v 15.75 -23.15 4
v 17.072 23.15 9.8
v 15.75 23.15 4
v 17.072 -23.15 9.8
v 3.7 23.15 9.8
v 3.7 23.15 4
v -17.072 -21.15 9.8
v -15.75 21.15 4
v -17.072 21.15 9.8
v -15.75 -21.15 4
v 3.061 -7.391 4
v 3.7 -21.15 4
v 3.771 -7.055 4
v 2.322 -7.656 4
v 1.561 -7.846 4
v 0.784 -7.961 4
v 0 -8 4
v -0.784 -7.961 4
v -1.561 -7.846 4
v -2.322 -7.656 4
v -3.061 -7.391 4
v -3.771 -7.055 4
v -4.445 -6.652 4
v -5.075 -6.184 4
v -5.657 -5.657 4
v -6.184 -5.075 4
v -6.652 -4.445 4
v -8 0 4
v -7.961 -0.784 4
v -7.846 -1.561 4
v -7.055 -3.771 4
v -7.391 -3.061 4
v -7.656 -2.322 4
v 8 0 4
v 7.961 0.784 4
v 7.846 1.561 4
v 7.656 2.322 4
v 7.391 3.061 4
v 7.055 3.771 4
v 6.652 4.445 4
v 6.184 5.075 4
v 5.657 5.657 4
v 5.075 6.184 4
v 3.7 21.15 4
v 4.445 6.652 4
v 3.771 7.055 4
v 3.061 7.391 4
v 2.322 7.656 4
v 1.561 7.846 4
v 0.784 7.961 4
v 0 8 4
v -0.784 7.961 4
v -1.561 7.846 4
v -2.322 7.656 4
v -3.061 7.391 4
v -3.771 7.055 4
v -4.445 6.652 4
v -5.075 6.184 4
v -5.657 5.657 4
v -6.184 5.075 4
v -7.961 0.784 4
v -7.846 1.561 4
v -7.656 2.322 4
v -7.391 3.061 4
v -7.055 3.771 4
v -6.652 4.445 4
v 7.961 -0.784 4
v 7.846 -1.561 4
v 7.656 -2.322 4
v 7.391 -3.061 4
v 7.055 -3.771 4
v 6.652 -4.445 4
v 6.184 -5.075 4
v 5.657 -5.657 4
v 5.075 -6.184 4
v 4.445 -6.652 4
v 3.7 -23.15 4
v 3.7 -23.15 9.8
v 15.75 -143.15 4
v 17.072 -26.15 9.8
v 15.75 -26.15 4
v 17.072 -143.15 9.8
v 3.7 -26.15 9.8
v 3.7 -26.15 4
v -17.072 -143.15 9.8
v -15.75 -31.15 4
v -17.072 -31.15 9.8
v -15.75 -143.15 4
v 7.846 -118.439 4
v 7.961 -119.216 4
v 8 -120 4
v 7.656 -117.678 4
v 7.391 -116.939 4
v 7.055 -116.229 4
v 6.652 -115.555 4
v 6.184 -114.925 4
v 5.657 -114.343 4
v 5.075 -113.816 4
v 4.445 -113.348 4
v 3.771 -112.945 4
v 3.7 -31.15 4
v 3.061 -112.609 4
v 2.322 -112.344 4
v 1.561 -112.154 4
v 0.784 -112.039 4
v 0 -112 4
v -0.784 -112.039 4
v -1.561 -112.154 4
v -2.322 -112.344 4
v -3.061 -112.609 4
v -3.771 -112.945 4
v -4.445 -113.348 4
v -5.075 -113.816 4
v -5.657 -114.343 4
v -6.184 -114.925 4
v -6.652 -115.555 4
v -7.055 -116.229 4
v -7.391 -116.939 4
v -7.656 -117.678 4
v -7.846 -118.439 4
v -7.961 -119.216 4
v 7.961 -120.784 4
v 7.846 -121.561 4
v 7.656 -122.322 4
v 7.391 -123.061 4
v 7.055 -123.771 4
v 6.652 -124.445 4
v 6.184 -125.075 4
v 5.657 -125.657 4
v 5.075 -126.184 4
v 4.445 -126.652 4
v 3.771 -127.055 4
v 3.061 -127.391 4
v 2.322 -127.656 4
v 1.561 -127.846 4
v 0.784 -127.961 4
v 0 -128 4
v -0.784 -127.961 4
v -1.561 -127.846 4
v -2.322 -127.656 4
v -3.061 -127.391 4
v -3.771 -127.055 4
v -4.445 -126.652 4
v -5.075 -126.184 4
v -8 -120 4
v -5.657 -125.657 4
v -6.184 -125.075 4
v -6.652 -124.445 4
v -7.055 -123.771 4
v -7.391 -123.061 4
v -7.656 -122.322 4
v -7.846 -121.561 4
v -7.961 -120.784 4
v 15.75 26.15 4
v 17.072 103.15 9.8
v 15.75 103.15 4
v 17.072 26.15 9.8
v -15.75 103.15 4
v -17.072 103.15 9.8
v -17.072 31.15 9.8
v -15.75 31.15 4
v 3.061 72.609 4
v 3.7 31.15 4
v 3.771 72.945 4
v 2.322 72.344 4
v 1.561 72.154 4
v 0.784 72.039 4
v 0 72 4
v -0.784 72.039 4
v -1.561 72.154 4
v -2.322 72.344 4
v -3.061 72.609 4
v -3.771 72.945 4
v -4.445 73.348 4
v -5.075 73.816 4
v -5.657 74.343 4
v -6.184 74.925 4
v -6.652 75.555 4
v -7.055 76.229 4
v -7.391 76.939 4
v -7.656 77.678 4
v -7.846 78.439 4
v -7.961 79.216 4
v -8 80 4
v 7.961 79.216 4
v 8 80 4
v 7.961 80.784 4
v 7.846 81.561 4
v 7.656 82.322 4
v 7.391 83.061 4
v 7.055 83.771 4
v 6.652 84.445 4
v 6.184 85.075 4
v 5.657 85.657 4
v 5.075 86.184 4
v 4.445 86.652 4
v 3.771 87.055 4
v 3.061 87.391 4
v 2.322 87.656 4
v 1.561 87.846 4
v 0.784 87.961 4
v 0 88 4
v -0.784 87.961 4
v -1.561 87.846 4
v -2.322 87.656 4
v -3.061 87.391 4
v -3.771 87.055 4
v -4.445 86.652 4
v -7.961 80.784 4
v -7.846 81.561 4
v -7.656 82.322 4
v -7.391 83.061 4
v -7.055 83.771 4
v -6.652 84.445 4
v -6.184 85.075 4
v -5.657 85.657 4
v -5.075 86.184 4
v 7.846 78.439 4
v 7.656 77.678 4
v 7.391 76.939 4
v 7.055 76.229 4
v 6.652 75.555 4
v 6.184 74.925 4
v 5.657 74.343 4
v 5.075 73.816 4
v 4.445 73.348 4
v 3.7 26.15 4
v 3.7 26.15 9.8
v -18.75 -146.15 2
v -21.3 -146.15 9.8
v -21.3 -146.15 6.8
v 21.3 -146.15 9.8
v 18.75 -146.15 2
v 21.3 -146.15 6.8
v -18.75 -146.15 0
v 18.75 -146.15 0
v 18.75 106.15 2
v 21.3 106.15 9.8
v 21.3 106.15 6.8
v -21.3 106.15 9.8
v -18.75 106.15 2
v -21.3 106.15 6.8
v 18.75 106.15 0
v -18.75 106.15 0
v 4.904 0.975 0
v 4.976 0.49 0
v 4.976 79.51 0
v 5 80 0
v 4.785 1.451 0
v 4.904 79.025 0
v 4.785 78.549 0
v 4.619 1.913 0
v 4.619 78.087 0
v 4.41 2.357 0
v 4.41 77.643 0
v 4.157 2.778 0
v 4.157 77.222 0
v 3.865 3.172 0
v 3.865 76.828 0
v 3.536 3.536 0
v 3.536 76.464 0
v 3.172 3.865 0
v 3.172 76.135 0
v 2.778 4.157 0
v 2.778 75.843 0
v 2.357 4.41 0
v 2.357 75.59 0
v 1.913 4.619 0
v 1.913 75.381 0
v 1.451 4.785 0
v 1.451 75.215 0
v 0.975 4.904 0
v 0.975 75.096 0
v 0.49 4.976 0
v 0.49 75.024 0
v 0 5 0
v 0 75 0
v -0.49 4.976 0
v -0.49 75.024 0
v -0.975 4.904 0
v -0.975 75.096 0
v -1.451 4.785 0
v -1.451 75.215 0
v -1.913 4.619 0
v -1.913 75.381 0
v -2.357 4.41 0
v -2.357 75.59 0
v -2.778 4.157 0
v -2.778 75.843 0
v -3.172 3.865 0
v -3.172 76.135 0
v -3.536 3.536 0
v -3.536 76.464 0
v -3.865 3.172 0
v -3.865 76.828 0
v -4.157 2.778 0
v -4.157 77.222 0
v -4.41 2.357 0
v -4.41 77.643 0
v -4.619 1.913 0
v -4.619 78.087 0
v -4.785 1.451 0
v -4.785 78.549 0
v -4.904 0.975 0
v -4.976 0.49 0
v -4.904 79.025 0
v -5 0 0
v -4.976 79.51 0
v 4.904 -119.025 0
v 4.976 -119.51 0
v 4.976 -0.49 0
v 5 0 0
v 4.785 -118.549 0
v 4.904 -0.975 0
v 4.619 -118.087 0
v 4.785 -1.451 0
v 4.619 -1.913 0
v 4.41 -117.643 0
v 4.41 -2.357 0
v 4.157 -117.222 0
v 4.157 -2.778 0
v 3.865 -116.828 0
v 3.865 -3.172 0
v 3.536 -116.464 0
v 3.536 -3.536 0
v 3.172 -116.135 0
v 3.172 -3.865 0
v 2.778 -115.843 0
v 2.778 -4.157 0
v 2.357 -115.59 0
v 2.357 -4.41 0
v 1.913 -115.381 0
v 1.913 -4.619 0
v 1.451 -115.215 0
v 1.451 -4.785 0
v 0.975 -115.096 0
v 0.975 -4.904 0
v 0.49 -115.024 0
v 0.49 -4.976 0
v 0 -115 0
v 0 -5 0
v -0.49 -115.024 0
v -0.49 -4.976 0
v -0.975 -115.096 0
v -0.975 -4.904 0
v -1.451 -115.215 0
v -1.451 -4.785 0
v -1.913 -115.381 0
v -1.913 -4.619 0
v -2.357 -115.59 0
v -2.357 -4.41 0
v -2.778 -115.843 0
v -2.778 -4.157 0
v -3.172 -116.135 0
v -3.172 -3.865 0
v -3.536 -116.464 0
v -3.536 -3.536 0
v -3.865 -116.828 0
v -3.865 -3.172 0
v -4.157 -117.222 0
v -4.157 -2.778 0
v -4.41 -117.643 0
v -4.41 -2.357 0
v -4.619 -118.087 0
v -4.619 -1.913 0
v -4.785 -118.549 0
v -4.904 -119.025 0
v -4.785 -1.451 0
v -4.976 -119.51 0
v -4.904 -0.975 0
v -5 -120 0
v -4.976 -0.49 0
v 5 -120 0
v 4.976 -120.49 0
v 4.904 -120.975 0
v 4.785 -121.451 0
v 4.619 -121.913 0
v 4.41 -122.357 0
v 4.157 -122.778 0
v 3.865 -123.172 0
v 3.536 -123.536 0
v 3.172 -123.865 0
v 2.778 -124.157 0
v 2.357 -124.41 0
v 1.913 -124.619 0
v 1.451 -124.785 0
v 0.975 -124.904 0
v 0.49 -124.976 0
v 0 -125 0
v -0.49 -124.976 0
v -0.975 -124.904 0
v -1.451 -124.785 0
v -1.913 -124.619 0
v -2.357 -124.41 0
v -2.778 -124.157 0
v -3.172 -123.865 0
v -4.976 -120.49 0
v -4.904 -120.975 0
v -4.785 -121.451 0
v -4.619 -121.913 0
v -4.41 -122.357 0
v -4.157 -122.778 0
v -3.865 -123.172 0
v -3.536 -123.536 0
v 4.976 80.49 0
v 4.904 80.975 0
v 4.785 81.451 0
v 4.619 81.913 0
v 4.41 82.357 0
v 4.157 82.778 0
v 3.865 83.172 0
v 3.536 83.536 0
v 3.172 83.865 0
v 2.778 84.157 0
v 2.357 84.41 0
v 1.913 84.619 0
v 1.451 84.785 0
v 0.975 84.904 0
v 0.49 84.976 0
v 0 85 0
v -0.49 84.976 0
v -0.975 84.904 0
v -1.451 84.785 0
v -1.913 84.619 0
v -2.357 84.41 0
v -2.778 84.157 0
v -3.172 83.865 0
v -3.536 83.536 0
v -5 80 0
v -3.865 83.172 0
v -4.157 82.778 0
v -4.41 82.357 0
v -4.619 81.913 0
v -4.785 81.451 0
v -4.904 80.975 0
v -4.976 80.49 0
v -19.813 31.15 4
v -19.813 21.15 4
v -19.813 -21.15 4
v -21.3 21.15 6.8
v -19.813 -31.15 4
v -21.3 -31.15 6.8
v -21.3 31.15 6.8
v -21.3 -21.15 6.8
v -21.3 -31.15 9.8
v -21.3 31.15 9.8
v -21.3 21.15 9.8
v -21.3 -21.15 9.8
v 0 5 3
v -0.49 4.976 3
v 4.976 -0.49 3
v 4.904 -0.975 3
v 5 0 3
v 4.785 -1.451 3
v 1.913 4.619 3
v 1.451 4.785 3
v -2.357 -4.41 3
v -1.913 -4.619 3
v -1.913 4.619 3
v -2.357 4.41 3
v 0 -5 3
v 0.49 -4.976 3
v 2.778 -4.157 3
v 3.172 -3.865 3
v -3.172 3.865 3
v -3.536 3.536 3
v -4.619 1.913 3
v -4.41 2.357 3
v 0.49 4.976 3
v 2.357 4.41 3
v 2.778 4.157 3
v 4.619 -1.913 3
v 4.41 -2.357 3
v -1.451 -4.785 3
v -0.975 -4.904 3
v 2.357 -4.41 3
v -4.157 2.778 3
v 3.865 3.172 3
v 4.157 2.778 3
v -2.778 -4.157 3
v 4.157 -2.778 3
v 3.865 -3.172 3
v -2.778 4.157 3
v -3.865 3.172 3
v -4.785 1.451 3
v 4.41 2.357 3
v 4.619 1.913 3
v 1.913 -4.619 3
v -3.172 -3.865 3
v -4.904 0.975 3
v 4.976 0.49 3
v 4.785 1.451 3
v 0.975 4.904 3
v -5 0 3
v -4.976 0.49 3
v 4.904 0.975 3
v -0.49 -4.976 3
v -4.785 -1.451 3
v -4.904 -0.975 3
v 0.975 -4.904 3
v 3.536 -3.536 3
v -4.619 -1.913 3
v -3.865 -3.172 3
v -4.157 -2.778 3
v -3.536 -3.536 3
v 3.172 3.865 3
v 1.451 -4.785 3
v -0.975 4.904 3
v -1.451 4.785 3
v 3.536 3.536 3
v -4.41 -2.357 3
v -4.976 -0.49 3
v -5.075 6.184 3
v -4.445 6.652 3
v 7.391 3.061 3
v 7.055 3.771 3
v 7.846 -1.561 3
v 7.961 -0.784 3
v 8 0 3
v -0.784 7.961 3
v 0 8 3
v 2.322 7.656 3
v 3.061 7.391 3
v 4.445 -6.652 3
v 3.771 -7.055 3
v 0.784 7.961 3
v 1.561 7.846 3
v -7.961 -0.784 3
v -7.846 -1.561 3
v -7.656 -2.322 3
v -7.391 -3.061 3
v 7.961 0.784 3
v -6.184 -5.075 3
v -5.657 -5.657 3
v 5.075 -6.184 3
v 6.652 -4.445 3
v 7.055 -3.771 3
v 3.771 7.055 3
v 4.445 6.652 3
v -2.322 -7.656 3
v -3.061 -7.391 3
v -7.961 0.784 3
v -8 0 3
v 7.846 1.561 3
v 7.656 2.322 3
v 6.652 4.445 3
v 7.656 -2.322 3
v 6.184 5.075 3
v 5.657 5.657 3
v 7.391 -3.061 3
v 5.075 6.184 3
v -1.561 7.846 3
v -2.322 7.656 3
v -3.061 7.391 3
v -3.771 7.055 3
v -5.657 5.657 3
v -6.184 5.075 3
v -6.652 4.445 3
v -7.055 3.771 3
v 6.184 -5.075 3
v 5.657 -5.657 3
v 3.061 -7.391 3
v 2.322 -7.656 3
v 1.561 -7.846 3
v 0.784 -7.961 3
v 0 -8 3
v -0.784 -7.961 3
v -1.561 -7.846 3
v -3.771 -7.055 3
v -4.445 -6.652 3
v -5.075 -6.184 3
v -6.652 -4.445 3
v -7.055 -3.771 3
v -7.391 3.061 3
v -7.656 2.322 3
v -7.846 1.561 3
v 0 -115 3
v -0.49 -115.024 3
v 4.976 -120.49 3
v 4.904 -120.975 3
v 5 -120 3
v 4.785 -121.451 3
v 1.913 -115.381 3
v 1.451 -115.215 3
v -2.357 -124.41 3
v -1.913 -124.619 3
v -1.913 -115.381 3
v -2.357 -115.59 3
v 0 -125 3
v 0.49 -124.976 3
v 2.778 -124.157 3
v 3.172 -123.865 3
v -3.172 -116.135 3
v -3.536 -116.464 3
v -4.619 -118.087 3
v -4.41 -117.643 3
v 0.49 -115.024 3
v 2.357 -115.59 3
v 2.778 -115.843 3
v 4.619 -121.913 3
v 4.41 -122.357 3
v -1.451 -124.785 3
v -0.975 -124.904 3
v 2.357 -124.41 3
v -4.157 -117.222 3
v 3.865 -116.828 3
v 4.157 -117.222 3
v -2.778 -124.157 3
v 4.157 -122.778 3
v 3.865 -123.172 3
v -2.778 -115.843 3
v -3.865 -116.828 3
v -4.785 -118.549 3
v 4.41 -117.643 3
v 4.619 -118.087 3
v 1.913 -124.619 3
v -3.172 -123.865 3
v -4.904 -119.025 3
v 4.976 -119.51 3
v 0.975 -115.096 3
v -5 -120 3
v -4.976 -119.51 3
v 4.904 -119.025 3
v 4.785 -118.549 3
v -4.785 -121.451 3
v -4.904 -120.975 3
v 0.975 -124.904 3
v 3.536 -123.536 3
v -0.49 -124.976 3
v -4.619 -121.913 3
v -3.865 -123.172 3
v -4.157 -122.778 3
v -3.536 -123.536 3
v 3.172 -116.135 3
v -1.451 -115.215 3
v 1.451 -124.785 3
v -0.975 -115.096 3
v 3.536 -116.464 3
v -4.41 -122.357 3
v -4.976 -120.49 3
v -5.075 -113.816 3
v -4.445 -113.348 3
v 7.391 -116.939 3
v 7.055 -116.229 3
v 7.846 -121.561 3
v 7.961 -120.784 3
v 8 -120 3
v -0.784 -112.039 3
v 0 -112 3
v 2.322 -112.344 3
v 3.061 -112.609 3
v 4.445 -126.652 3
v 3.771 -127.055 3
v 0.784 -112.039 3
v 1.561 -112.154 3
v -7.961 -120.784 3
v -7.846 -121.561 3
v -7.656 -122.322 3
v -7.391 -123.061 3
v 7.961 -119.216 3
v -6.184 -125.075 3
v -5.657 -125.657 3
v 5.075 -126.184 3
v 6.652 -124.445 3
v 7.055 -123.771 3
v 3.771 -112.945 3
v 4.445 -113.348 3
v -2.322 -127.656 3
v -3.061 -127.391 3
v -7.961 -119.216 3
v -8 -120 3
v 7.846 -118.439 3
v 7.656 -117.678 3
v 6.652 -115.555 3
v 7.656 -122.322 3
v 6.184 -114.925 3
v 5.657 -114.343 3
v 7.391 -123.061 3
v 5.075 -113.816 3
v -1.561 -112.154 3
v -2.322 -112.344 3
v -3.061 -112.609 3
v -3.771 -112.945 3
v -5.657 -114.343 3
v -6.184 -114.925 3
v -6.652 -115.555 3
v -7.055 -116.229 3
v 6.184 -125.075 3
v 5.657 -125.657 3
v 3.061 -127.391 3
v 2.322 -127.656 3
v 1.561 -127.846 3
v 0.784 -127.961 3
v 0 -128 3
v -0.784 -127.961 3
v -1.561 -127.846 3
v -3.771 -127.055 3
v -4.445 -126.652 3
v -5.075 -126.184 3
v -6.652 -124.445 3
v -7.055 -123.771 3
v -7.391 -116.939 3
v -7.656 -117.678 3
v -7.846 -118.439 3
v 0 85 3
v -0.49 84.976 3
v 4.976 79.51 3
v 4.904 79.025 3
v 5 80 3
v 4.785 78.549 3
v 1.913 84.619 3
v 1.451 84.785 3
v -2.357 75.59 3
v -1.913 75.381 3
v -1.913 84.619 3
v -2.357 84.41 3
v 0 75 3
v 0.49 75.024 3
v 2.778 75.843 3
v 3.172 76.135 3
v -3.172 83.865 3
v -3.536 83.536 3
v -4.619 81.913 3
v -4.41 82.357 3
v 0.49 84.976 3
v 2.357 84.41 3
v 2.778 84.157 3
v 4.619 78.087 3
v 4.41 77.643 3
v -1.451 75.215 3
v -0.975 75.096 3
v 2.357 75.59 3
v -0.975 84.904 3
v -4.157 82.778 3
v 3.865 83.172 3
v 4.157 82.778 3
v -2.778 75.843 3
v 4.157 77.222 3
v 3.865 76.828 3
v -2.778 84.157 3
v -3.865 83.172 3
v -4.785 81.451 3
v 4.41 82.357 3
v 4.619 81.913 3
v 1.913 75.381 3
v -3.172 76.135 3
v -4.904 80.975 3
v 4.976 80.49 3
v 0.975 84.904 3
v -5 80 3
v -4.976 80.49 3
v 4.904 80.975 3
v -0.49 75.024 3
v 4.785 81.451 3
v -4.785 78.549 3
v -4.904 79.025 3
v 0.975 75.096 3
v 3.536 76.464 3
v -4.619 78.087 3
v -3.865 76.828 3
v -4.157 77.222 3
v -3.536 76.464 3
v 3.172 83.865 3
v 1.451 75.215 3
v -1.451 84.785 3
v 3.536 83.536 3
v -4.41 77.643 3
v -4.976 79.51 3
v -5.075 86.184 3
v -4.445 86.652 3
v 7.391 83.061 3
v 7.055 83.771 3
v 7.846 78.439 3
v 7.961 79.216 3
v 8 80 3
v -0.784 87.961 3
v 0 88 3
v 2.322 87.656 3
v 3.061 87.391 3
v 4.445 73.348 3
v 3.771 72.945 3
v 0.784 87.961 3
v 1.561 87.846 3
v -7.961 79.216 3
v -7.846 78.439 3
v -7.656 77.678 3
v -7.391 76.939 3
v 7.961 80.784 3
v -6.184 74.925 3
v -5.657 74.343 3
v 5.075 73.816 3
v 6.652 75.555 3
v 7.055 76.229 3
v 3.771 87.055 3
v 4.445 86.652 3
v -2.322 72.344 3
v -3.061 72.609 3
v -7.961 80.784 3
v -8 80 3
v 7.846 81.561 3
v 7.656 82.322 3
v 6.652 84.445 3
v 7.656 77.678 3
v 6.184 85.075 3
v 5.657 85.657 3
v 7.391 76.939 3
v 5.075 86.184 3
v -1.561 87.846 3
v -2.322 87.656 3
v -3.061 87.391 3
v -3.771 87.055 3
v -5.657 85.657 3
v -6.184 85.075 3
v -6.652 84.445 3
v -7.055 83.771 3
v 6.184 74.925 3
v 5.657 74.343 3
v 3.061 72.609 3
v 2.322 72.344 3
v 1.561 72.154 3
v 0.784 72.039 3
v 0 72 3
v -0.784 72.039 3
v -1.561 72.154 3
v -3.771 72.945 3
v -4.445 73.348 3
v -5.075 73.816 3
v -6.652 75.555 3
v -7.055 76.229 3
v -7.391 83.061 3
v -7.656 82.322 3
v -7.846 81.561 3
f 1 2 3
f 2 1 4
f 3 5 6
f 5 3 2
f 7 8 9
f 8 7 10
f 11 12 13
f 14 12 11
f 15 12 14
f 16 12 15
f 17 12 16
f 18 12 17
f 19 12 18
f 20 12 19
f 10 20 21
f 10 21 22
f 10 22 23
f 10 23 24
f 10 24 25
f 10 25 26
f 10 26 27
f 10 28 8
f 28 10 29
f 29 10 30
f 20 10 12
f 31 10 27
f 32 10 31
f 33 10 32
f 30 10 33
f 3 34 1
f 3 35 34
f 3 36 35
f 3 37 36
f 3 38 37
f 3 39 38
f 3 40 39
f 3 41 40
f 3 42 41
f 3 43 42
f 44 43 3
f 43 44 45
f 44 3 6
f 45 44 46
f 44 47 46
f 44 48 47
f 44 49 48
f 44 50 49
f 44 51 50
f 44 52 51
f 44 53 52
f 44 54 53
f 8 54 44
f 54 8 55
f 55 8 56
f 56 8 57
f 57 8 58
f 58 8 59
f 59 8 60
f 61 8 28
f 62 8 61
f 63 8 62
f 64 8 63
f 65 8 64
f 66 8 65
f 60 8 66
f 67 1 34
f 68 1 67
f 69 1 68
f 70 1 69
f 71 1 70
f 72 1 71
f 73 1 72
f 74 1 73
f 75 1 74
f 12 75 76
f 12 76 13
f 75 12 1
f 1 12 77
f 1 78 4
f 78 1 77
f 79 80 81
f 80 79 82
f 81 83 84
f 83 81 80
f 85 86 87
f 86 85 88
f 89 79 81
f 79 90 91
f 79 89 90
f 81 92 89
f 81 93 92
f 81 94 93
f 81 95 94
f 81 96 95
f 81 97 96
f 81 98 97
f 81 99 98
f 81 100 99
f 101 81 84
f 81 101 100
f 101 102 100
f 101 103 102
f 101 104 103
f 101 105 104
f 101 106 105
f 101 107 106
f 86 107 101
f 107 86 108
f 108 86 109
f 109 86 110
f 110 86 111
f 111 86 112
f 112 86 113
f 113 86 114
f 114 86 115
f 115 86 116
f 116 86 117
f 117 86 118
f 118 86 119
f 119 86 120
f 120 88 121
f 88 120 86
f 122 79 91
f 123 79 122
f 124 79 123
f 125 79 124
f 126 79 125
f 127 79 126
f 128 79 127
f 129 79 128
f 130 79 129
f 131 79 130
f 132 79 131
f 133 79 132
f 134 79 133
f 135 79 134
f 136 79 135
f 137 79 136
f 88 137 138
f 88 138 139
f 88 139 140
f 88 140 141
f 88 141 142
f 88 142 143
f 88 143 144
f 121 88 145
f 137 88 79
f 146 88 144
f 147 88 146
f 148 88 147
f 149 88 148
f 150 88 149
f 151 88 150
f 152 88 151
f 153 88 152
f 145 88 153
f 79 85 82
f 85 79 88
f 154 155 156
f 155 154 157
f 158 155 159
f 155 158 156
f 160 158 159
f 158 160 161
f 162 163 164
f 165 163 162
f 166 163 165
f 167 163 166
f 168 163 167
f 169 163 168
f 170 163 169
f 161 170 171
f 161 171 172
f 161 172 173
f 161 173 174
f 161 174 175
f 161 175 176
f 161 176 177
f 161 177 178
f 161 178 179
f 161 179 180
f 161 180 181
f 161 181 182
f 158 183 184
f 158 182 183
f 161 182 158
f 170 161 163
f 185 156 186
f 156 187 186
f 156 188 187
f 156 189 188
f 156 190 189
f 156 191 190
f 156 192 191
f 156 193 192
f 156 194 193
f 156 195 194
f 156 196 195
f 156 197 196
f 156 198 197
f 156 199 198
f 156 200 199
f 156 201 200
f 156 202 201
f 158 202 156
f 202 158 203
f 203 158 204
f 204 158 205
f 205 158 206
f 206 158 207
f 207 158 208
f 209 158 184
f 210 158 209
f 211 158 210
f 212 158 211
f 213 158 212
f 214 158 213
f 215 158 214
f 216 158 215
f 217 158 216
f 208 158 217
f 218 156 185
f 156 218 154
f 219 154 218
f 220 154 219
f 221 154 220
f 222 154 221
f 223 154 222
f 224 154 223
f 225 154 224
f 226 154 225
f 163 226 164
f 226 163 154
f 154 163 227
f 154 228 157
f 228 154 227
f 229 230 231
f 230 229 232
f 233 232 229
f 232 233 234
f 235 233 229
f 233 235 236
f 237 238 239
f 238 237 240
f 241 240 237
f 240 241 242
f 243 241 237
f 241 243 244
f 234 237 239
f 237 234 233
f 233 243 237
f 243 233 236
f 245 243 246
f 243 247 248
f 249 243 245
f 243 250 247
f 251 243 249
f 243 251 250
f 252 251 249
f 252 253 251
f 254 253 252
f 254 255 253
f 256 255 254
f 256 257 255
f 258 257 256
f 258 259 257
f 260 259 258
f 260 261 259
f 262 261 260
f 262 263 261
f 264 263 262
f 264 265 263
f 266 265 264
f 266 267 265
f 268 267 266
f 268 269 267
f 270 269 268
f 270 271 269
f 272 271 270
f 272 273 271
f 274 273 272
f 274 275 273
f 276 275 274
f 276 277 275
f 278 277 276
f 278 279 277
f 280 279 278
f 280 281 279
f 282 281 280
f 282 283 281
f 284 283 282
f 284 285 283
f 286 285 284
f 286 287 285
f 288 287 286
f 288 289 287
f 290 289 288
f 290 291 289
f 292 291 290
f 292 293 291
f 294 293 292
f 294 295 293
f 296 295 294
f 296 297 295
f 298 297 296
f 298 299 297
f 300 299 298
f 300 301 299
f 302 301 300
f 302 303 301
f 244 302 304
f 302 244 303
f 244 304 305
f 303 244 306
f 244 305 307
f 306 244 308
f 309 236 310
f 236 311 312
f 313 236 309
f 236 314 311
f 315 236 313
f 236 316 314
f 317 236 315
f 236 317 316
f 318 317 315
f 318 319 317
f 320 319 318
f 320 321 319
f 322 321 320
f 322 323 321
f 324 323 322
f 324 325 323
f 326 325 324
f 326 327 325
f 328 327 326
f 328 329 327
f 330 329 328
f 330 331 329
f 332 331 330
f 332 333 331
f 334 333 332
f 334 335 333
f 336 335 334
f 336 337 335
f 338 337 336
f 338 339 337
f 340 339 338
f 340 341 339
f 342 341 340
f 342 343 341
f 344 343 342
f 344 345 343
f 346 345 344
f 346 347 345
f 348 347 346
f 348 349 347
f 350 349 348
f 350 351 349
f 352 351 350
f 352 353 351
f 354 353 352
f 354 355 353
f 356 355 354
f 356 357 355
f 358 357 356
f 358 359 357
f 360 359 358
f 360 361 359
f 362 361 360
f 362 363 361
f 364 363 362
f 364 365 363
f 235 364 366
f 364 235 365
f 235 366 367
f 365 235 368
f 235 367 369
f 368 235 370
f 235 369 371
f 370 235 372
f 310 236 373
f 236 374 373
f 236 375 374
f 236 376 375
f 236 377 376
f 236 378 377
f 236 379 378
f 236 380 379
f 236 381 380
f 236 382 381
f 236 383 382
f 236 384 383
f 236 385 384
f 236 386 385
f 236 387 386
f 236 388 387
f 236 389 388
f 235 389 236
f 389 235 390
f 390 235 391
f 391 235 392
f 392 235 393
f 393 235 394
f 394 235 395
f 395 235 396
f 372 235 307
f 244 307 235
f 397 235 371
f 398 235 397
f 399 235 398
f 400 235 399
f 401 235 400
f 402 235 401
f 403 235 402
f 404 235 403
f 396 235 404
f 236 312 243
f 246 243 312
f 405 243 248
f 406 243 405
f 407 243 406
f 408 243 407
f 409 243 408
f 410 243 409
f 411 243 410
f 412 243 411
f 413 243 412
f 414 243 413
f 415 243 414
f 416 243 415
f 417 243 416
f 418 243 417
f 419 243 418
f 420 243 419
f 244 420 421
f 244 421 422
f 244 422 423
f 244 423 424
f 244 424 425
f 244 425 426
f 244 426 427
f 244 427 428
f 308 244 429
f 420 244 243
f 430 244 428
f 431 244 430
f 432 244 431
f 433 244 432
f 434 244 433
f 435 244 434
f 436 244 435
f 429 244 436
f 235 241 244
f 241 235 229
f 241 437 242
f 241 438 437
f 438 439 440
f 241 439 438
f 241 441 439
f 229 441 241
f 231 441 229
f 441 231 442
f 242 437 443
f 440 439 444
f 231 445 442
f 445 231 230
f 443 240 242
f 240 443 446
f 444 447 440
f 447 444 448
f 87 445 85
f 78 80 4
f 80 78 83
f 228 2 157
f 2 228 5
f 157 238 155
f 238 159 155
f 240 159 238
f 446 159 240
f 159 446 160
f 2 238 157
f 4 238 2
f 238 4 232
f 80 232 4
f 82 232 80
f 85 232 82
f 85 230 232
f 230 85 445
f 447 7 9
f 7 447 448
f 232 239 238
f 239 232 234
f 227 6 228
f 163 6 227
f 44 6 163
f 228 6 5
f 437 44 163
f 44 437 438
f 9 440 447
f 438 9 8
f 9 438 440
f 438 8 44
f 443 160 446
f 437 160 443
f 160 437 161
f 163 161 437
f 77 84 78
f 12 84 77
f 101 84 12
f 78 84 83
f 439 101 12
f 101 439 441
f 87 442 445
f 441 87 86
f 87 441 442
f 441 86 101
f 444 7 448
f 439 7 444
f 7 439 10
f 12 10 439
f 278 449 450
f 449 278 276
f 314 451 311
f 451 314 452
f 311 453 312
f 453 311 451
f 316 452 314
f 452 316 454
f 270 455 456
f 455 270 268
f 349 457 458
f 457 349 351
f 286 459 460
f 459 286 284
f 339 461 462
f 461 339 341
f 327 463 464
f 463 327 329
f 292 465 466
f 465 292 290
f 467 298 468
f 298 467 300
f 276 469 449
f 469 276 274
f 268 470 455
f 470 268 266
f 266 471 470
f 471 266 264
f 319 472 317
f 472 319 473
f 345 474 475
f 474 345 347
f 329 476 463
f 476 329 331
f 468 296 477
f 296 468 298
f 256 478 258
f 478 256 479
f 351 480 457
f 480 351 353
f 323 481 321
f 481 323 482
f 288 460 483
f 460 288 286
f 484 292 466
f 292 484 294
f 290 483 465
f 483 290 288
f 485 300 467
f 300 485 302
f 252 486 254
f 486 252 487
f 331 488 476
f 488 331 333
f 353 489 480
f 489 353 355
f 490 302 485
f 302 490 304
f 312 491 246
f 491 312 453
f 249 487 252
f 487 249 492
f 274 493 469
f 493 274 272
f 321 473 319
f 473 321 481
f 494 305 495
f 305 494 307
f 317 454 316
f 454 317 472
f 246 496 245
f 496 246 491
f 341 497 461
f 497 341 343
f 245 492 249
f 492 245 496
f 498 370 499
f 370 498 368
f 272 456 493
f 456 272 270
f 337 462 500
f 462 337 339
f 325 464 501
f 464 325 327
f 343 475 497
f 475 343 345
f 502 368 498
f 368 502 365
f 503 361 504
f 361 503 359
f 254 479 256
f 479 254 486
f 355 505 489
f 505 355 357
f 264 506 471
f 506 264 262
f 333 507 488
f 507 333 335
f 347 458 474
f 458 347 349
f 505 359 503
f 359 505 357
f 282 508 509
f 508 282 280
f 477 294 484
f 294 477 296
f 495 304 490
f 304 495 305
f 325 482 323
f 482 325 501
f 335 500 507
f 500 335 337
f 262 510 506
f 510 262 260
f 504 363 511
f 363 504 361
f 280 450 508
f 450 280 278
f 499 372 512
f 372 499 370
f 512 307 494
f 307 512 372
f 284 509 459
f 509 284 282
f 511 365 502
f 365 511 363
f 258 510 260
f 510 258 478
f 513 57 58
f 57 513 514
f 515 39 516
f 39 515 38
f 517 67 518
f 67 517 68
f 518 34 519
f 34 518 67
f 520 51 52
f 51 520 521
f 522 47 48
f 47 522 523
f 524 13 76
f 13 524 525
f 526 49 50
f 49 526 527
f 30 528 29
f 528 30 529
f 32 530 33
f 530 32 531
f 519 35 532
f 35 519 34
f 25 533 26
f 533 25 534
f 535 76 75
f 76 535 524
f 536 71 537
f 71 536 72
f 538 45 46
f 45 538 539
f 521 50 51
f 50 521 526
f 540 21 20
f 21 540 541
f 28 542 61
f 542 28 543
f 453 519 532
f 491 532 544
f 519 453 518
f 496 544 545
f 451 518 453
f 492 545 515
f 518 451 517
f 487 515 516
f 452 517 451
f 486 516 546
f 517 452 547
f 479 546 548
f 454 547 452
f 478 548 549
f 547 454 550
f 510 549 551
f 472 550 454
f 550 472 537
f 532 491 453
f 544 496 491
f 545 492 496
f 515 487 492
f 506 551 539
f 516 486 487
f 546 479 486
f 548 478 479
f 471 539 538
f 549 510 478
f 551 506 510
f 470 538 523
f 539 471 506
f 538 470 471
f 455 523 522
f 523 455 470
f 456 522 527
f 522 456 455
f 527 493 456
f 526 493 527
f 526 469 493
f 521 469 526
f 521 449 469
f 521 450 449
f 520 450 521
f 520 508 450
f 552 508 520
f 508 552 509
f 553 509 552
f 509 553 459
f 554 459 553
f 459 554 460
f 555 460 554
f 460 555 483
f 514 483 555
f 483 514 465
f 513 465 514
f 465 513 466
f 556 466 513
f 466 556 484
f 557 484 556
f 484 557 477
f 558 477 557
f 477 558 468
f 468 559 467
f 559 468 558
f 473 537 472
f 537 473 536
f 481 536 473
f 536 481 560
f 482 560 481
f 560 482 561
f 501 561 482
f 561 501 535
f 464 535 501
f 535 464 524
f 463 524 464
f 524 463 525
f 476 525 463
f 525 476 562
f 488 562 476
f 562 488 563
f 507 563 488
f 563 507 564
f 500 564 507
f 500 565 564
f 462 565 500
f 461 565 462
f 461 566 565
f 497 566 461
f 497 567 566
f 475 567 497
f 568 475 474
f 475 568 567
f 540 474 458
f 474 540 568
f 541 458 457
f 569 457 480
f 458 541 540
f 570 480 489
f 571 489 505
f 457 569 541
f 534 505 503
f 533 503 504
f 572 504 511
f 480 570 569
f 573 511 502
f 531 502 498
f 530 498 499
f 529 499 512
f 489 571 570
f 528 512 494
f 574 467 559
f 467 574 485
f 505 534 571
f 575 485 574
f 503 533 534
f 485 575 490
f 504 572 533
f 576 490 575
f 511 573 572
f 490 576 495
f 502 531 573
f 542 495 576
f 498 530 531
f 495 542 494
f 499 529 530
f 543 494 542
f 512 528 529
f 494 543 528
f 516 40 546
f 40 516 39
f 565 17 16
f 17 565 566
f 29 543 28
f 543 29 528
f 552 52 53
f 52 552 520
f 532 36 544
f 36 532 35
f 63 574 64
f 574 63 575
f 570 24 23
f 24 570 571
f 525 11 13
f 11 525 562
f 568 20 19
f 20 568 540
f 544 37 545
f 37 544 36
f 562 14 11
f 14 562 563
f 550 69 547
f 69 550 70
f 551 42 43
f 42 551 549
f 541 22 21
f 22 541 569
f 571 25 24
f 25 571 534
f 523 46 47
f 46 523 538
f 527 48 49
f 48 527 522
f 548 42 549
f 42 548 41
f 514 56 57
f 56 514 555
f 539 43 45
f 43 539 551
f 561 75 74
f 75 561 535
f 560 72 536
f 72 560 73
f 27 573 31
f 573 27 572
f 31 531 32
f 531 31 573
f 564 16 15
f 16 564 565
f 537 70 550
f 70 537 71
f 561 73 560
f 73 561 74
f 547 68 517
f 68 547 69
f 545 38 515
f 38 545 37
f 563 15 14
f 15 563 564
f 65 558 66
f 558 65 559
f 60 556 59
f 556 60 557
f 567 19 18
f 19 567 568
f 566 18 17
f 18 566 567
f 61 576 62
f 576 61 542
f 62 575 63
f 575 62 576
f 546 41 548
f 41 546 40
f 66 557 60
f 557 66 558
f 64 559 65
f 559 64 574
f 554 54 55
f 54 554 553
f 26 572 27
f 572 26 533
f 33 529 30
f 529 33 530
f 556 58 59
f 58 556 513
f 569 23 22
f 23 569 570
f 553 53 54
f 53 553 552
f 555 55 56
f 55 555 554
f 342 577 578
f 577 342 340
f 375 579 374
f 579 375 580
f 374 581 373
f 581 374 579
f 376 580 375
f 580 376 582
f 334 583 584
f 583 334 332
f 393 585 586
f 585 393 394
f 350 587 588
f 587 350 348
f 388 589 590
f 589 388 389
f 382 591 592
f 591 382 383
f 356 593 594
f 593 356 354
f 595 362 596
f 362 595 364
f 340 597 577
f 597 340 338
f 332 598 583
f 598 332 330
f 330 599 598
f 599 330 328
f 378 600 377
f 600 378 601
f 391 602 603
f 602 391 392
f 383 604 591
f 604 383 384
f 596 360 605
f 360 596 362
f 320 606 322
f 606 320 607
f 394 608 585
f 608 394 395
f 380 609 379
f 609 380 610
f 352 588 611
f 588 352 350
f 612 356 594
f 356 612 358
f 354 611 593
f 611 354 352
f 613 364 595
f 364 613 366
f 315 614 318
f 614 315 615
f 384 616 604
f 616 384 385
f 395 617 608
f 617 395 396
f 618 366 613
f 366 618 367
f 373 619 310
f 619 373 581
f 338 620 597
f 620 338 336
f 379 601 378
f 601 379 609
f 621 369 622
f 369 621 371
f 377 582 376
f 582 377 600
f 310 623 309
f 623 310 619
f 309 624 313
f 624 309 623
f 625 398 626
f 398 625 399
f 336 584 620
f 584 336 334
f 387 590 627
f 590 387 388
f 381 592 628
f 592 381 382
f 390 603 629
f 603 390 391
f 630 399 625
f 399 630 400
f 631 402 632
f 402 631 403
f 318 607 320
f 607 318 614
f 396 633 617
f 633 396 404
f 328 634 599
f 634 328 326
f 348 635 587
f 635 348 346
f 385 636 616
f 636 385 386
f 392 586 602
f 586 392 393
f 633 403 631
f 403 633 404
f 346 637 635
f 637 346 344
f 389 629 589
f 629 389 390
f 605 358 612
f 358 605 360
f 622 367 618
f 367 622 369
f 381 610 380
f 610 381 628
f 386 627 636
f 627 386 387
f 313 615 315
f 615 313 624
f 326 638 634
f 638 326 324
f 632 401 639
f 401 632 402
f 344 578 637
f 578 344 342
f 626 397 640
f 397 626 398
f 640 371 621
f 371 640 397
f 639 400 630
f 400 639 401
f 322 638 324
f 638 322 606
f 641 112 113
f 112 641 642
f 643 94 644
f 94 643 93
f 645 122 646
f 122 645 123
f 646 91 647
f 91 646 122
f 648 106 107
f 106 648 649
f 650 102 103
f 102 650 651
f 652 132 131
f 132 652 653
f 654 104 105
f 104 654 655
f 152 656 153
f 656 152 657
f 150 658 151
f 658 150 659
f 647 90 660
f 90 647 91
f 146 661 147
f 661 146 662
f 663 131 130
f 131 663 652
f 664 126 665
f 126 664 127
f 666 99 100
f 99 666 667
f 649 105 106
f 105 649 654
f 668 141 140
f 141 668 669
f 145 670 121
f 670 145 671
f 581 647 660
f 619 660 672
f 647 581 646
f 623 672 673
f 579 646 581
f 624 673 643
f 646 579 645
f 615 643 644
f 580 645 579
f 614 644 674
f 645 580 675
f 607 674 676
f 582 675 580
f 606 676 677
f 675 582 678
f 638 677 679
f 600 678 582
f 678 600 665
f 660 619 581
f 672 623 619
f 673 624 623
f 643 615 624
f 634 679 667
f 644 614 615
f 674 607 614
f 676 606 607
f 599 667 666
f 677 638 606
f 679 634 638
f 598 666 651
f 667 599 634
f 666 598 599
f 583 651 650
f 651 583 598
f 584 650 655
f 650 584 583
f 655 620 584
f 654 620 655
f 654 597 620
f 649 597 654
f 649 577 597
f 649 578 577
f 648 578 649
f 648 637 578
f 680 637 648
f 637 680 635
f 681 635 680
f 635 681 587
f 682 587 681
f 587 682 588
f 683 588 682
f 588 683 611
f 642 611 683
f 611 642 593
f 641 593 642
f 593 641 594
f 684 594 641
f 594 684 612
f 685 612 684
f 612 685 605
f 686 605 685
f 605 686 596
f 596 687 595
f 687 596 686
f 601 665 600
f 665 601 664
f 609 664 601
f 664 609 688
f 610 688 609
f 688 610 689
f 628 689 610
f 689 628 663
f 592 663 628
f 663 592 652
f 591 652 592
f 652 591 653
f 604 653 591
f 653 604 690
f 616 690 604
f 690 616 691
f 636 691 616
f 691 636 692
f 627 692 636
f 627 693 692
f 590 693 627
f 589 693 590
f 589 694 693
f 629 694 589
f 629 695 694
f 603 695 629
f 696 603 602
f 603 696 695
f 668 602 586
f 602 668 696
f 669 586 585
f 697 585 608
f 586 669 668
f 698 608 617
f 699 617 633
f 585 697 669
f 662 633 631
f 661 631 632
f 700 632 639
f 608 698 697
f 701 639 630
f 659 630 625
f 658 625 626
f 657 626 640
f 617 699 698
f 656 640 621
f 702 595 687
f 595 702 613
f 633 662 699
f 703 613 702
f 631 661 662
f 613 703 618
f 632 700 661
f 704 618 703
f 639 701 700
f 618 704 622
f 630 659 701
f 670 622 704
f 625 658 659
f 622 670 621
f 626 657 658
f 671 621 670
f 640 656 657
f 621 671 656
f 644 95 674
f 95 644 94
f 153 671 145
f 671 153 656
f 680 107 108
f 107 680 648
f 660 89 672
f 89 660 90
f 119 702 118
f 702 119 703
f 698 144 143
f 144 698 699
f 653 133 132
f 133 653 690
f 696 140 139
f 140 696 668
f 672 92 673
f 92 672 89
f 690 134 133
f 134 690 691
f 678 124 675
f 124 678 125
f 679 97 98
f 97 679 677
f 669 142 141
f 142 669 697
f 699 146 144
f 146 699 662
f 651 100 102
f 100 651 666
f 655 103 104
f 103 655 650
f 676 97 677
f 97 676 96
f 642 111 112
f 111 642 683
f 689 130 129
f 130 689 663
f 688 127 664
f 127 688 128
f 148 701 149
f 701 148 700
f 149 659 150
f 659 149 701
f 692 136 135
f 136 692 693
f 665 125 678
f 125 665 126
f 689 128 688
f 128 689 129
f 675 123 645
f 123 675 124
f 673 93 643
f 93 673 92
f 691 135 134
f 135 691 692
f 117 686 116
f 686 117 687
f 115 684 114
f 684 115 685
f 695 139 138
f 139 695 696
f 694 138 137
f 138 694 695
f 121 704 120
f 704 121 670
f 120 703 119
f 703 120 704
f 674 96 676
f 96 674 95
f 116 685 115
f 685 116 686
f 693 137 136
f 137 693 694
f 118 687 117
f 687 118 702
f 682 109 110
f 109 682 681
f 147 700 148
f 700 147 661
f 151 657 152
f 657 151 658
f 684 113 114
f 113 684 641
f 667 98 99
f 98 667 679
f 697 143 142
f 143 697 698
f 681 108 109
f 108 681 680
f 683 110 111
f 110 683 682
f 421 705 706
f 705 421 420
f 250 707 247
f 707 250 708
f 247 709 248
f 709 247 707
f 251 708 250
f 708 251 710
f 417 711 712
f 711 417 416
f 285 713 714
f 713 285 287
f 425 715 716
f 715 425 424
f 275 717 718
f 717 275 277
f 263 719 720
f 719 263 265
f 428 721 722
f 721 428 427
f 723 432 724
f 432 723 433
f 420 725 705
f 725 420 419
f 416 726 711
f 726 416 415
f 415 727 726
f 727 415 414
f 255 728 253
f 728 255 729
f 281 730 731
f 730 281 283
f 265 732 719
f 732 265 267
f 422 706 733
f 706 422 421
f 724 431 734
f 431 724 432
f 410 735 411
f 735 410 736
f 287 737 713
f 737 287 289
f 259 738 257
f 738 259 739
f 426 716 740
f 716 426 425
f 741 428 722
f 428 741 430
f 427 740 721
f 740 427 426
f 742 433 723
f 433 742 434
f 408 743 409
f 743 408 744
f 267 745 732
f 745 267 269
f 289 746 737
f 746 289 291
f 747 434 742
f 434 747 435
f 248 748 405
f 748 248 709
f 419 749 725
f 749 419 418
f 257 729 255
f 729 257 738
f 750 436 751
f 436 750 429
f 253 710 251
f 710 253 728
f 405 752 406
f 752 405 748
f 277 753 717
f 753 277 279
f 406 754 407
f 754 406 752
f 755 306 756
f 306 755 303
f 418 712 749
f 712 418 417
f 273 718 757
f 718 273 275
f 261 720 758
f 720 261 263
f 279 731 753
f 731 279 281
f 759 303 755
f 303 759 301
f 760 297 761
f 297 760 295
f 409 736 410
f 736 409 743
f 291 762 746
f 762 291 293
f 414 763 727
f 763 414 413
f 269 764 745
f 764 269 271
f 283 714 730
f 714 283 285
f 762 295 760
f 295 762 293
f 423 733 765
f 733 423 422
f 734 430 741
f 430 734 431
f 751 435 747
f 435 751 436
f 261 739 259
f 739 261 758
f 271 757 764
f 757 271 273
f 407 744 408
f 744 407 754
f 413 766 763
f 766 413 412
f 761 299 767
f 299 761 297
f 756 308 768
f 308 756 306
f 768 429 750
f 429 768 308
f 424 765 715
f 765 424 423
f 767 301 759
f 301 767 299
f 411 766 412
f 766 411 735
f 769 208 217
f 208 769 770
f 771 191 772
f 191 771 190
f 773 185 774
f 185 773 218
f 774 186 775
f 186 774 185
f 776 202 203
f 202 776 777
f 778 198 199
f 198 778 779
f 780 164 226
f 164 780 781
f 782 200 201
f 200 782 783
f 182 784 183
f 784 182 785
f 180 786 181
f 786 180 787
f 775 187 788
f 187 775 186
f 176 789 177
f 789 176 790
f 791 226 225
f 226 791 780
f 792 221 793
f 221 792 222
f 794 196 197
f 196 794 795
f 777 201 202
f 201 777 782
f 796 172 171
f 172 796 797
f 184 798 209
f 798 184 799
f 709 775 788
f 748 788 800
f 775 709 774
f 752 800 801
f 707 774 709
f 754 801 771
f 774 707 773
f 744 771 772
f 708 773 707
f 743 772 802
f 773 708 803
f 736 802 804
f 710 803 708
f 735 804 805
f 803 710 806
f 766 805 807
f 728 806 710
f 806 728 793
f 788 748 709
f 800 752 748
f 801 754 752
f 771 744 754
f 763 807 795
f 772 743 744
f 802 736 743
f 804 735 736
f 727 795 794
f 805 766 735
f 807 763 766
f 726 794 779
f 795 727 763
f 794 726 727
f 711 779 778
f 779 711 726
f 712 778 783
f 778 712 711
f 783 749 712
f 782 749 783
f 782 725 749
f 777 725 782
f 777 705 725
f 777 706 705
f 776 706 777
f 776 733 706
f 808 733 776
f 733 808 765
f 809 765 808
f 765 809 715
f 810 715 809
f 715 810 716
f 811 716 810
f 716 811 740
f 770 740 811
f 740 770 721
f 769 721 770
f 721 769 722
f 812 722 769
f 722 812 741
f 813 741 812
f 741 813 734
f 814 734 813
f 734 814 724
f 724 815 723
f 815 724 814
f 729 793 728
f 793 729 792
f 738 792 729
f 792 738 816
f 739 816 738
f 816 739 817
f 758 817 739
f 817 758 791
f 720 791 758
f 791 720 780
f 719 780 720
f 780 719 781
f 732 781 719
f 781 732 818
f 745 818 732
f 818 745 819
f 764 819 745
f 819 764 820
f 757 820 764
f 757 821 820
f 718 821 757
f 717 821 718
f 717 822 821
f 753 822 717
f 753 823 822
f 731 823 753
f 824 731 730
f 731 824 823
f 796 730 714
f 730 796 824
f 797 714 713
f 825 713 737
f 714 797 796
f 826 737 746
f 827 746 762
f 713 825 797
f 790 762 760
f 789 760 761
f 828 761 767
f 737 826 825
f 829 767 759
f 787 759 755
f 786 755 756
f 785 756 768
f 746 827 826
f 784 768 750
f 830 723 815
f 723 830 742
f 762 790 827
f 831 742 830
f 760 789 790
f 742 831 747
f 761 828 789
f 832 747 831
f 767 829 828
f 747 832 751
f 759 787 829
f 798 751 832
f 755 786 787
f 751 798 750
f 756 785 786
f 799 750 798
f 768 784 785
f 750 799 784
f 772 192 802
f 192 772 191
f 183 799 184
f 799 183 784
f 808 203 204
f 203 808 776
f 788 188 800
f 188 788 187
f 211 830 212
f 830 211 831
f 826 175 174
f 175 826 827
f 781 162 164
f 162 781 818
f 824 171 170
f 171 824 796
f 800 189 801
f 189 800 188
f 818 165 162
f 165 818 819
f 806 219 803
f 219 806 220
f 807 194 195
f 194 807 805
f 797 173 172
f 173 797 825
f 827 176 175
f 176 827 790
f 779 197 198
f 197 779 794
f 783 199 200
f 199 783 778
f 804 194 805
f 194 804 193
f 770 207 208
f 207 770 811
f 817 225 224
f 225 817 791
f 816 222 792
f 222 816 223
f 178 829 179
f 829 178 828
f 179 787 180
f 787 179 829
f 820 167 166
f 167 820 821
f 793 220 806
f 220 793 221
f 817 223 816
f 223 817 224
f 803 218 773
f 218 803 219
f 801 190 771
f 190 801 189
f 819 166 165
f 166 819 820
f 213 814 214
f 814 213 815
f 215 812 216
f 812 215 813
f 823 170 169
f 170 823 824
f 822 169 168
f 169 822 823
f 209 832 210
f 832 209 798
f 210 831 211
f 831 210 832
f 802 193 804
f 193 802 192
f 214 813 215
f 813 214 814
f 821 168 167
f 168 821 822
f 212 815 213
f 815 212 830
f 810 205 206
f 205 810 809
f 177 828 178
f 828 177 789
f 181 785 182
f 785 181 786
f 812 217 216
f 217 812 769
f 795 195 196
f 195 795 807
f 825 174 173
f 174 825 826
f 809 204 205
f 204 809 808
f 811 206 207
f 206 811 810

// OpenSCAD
//
// manfrotto 484rc2 quick plate replacement, with variable width
//
// Copyright 2013-2014 Sébastien Roy (roys@iro.umontreal.ca)
// Licence: public domain
// 

/* [General] */

// Extra width on one side
extra_left=120; // [0:150] 

// Extra width on the other side
extra_right=80; // [0:150]

/* [Left Hole] */

left_hole_style="standard"; // [standard,3/8 tap, 1/4 tap,prosilica,custom,none]
// (used if style is "custom")
left_hole_diameter=20;
left_hole_x_offset=0;
left_hole_y_offset=0;

/* [Middle Hole] */

middle_hole_style="standard"; // [standard,3/8 tap,1/4 tap,prosilica,customm,none]
// (used if style is "custom")
middle_hole_diameter=20;
middle_hole_x_offset=0;
middle_hole_y_offset=0;

/* [Right Hole] */

right_hole_style="standard"; // [standard,3/8 tap,1/4 tap,prosilica,custom,none]
// (used if style is "custom")
right_hole_diameter=20;
right_hole_x_offset=0;
right_hole_y_offset=0;




// to stop customizer
module nop() { }

length = 2; //[1:32]
width = 2; //[1:32]
type = 9.6; //[9.6:Brick, 3.2:Tile, 19.2:Double Brick]
flat = 0; //[0:No, 1.9:Yes]
/* [Hidden] */

//
// General dimensions of the plate
//
// "largeur" determines how well the plate will attach to the head.
// "profondeur" is the width of the plate. 
//
largeur=42.6;
largeurtop=37.5;
profondeur=52.3;
hauteur=9.8;


//
// un solide "tappered" en x,
// de dimension largeur x prodondeur x hauteur
//
module tappered(largeur=30,largeurtop=20,profondeur=40,hauteur=10,head=2,base=3) {
      off=(largeur-largeurtop)/2;
	translate([0,profondeur,0])
	rotate([90,0,0])
	linear_extrude(height=profondeur)
		polygon(points=[
			[0,0],
			[largeur,0],
			[largeur,base],
			[largeurtop+off,hauteur-head],
			[largeurtop+off,hauteur],
			[off,hauteur],
			[off,hauteur-head],
			[0,base]
		]);
}

//
// solid plate
//
module m_base(extra1=0,extra2=0) {
	translate([0,-extra2,0]) tappered(largeur,largeurtop,profondeur+extra1+extra2,hauteur);
}


//
// inside material to remove from plate
//
module m_interieur(extra1=0,extra2=0) {
	translate([4,3,-1]) tappered(largeur-8,largeurtop-6,profondeur-6,hauteur-3,0,0);
	translate([4,profondeur,-1]) tappered(largeur-8,largeurtop-6,extra1-3,hauteur-3,0,0);
	translate([4,0*profondeur-extra2+3,-1]) tappered(largeur-8,largeurtop-6,extra2-3,hauteur-3,0,0);
}

//
// side material to be removed from the plate
//
module m_notch(extra1=0) {
	w=3;
	translate([-5,-5,-4]) cube([largeur-17.6+5,10+extra1,hauteur]);
}

//
// one hole in the plate. r is the radius,
// pos is the (x,y) position on the plate (leave z at 0).
// the (0,0) position is the center of the plate.
//
module m_trou(r=5,pos=[0,0,0]) {
	translate([largeur/2,profondeur/2,0]+pos) cylinder(h=hauteur*2,r=r,$fn=64);
}

module m_trou_counter(r=5,rr=16/2,hh=1,pos=[0,0,0]) {
	translate([largeur/2,profondeur/2,0]+pos) cylinder(h=hauteur*2,r=r,$fn=64);
	translate([largeur/2,profondeur/2,0]+pos) cylinder(h=hauteur-4+hh,r=rr,$fn=64);
}



module m_holes(style="standard",offset=[0,0,0],dia) {
	if( style=="standard" ) {
		m_trou_counter(10/2,16/2,1,offset);
	} else if( style=="3/8 tap" ) {
		m_trou(5/16*25.4/2,offset);
	} else if( style=="1/4 tap" ) {
		m_trou(13/64*25.4/2,offset);
	} else if( style=="prosilica" ) {
		m_trou(1.7,[-9,-13,0]+offset);
		m_trou(1.7,[-9,13,0]+offset);
	} else if( style=="custom" ) {
		m_trou(dia/2,offset);
	}
}

//
// position the following model to make it printable
// this is set for up=z-axis printing (ex: mendelmax)
// Change it for your printer...
//
module m_printable() {
	translate([-largeur/2,profondeur/2,hauteur])
	rotate([180,0,0])
	child(0);
};


//
// Basic complete plate, without holes
//
module m_manfrotto484() {
	difference() {
		m_base(extra_left,extra_right);
		m_interieur(extra_left,extra_right);
		m_notch(0);
		translate([0,profondeur,0]) m_notch(0/*extraprof*/);
/*
		if( extra_left>20 ) {		
			m_trou(r=5,pos=[0,extra_left,0]);
		}
		if( extra_right>20 ) {		
			m_trou(r=5,pos=[0,-extra_right,0]);
		}
*/
	}
}

//
// example of a plate with 4 holes.
// Change as needed.
//
module m_manfrotto484_generic() {
	difference() {
		m_manfrotto484();
		m_holes(middle_hole_style,[middle_hole_x_offset,middle_hole_y_offset,0],middle_hole_diameter);
		if( extra_left>20 ) m_holes(left_hole_style,[left_hole_x_offset,left_hole_y_offset+extra_left,0],left_hole_diameter);
		if( extra_right>20 ) m_holes(right_hole_style,[right_hole_x_offset,right_hole_y_offset-extra_right,0],right_hole_diameter);
		//m_trou(2.5,[10,0,0]);
		//m_trou(2.5,[0,15,0]);
		//m_trou(2.5,[0,-15,0]);
	}
}

//
// plate made for Allied/Prosilica GC650 (and similar cameras)
// the holes separation is 26mm.
//
module m_manfrotto484_prosilica() {
	difference() {
		m_manfrotto484();
		m_trou(1.7,[-9,-13,0]);
		m_trou(1.7,[-9,13,0]);
	}
}


m_printable()  m_manfrotto484_generic();
